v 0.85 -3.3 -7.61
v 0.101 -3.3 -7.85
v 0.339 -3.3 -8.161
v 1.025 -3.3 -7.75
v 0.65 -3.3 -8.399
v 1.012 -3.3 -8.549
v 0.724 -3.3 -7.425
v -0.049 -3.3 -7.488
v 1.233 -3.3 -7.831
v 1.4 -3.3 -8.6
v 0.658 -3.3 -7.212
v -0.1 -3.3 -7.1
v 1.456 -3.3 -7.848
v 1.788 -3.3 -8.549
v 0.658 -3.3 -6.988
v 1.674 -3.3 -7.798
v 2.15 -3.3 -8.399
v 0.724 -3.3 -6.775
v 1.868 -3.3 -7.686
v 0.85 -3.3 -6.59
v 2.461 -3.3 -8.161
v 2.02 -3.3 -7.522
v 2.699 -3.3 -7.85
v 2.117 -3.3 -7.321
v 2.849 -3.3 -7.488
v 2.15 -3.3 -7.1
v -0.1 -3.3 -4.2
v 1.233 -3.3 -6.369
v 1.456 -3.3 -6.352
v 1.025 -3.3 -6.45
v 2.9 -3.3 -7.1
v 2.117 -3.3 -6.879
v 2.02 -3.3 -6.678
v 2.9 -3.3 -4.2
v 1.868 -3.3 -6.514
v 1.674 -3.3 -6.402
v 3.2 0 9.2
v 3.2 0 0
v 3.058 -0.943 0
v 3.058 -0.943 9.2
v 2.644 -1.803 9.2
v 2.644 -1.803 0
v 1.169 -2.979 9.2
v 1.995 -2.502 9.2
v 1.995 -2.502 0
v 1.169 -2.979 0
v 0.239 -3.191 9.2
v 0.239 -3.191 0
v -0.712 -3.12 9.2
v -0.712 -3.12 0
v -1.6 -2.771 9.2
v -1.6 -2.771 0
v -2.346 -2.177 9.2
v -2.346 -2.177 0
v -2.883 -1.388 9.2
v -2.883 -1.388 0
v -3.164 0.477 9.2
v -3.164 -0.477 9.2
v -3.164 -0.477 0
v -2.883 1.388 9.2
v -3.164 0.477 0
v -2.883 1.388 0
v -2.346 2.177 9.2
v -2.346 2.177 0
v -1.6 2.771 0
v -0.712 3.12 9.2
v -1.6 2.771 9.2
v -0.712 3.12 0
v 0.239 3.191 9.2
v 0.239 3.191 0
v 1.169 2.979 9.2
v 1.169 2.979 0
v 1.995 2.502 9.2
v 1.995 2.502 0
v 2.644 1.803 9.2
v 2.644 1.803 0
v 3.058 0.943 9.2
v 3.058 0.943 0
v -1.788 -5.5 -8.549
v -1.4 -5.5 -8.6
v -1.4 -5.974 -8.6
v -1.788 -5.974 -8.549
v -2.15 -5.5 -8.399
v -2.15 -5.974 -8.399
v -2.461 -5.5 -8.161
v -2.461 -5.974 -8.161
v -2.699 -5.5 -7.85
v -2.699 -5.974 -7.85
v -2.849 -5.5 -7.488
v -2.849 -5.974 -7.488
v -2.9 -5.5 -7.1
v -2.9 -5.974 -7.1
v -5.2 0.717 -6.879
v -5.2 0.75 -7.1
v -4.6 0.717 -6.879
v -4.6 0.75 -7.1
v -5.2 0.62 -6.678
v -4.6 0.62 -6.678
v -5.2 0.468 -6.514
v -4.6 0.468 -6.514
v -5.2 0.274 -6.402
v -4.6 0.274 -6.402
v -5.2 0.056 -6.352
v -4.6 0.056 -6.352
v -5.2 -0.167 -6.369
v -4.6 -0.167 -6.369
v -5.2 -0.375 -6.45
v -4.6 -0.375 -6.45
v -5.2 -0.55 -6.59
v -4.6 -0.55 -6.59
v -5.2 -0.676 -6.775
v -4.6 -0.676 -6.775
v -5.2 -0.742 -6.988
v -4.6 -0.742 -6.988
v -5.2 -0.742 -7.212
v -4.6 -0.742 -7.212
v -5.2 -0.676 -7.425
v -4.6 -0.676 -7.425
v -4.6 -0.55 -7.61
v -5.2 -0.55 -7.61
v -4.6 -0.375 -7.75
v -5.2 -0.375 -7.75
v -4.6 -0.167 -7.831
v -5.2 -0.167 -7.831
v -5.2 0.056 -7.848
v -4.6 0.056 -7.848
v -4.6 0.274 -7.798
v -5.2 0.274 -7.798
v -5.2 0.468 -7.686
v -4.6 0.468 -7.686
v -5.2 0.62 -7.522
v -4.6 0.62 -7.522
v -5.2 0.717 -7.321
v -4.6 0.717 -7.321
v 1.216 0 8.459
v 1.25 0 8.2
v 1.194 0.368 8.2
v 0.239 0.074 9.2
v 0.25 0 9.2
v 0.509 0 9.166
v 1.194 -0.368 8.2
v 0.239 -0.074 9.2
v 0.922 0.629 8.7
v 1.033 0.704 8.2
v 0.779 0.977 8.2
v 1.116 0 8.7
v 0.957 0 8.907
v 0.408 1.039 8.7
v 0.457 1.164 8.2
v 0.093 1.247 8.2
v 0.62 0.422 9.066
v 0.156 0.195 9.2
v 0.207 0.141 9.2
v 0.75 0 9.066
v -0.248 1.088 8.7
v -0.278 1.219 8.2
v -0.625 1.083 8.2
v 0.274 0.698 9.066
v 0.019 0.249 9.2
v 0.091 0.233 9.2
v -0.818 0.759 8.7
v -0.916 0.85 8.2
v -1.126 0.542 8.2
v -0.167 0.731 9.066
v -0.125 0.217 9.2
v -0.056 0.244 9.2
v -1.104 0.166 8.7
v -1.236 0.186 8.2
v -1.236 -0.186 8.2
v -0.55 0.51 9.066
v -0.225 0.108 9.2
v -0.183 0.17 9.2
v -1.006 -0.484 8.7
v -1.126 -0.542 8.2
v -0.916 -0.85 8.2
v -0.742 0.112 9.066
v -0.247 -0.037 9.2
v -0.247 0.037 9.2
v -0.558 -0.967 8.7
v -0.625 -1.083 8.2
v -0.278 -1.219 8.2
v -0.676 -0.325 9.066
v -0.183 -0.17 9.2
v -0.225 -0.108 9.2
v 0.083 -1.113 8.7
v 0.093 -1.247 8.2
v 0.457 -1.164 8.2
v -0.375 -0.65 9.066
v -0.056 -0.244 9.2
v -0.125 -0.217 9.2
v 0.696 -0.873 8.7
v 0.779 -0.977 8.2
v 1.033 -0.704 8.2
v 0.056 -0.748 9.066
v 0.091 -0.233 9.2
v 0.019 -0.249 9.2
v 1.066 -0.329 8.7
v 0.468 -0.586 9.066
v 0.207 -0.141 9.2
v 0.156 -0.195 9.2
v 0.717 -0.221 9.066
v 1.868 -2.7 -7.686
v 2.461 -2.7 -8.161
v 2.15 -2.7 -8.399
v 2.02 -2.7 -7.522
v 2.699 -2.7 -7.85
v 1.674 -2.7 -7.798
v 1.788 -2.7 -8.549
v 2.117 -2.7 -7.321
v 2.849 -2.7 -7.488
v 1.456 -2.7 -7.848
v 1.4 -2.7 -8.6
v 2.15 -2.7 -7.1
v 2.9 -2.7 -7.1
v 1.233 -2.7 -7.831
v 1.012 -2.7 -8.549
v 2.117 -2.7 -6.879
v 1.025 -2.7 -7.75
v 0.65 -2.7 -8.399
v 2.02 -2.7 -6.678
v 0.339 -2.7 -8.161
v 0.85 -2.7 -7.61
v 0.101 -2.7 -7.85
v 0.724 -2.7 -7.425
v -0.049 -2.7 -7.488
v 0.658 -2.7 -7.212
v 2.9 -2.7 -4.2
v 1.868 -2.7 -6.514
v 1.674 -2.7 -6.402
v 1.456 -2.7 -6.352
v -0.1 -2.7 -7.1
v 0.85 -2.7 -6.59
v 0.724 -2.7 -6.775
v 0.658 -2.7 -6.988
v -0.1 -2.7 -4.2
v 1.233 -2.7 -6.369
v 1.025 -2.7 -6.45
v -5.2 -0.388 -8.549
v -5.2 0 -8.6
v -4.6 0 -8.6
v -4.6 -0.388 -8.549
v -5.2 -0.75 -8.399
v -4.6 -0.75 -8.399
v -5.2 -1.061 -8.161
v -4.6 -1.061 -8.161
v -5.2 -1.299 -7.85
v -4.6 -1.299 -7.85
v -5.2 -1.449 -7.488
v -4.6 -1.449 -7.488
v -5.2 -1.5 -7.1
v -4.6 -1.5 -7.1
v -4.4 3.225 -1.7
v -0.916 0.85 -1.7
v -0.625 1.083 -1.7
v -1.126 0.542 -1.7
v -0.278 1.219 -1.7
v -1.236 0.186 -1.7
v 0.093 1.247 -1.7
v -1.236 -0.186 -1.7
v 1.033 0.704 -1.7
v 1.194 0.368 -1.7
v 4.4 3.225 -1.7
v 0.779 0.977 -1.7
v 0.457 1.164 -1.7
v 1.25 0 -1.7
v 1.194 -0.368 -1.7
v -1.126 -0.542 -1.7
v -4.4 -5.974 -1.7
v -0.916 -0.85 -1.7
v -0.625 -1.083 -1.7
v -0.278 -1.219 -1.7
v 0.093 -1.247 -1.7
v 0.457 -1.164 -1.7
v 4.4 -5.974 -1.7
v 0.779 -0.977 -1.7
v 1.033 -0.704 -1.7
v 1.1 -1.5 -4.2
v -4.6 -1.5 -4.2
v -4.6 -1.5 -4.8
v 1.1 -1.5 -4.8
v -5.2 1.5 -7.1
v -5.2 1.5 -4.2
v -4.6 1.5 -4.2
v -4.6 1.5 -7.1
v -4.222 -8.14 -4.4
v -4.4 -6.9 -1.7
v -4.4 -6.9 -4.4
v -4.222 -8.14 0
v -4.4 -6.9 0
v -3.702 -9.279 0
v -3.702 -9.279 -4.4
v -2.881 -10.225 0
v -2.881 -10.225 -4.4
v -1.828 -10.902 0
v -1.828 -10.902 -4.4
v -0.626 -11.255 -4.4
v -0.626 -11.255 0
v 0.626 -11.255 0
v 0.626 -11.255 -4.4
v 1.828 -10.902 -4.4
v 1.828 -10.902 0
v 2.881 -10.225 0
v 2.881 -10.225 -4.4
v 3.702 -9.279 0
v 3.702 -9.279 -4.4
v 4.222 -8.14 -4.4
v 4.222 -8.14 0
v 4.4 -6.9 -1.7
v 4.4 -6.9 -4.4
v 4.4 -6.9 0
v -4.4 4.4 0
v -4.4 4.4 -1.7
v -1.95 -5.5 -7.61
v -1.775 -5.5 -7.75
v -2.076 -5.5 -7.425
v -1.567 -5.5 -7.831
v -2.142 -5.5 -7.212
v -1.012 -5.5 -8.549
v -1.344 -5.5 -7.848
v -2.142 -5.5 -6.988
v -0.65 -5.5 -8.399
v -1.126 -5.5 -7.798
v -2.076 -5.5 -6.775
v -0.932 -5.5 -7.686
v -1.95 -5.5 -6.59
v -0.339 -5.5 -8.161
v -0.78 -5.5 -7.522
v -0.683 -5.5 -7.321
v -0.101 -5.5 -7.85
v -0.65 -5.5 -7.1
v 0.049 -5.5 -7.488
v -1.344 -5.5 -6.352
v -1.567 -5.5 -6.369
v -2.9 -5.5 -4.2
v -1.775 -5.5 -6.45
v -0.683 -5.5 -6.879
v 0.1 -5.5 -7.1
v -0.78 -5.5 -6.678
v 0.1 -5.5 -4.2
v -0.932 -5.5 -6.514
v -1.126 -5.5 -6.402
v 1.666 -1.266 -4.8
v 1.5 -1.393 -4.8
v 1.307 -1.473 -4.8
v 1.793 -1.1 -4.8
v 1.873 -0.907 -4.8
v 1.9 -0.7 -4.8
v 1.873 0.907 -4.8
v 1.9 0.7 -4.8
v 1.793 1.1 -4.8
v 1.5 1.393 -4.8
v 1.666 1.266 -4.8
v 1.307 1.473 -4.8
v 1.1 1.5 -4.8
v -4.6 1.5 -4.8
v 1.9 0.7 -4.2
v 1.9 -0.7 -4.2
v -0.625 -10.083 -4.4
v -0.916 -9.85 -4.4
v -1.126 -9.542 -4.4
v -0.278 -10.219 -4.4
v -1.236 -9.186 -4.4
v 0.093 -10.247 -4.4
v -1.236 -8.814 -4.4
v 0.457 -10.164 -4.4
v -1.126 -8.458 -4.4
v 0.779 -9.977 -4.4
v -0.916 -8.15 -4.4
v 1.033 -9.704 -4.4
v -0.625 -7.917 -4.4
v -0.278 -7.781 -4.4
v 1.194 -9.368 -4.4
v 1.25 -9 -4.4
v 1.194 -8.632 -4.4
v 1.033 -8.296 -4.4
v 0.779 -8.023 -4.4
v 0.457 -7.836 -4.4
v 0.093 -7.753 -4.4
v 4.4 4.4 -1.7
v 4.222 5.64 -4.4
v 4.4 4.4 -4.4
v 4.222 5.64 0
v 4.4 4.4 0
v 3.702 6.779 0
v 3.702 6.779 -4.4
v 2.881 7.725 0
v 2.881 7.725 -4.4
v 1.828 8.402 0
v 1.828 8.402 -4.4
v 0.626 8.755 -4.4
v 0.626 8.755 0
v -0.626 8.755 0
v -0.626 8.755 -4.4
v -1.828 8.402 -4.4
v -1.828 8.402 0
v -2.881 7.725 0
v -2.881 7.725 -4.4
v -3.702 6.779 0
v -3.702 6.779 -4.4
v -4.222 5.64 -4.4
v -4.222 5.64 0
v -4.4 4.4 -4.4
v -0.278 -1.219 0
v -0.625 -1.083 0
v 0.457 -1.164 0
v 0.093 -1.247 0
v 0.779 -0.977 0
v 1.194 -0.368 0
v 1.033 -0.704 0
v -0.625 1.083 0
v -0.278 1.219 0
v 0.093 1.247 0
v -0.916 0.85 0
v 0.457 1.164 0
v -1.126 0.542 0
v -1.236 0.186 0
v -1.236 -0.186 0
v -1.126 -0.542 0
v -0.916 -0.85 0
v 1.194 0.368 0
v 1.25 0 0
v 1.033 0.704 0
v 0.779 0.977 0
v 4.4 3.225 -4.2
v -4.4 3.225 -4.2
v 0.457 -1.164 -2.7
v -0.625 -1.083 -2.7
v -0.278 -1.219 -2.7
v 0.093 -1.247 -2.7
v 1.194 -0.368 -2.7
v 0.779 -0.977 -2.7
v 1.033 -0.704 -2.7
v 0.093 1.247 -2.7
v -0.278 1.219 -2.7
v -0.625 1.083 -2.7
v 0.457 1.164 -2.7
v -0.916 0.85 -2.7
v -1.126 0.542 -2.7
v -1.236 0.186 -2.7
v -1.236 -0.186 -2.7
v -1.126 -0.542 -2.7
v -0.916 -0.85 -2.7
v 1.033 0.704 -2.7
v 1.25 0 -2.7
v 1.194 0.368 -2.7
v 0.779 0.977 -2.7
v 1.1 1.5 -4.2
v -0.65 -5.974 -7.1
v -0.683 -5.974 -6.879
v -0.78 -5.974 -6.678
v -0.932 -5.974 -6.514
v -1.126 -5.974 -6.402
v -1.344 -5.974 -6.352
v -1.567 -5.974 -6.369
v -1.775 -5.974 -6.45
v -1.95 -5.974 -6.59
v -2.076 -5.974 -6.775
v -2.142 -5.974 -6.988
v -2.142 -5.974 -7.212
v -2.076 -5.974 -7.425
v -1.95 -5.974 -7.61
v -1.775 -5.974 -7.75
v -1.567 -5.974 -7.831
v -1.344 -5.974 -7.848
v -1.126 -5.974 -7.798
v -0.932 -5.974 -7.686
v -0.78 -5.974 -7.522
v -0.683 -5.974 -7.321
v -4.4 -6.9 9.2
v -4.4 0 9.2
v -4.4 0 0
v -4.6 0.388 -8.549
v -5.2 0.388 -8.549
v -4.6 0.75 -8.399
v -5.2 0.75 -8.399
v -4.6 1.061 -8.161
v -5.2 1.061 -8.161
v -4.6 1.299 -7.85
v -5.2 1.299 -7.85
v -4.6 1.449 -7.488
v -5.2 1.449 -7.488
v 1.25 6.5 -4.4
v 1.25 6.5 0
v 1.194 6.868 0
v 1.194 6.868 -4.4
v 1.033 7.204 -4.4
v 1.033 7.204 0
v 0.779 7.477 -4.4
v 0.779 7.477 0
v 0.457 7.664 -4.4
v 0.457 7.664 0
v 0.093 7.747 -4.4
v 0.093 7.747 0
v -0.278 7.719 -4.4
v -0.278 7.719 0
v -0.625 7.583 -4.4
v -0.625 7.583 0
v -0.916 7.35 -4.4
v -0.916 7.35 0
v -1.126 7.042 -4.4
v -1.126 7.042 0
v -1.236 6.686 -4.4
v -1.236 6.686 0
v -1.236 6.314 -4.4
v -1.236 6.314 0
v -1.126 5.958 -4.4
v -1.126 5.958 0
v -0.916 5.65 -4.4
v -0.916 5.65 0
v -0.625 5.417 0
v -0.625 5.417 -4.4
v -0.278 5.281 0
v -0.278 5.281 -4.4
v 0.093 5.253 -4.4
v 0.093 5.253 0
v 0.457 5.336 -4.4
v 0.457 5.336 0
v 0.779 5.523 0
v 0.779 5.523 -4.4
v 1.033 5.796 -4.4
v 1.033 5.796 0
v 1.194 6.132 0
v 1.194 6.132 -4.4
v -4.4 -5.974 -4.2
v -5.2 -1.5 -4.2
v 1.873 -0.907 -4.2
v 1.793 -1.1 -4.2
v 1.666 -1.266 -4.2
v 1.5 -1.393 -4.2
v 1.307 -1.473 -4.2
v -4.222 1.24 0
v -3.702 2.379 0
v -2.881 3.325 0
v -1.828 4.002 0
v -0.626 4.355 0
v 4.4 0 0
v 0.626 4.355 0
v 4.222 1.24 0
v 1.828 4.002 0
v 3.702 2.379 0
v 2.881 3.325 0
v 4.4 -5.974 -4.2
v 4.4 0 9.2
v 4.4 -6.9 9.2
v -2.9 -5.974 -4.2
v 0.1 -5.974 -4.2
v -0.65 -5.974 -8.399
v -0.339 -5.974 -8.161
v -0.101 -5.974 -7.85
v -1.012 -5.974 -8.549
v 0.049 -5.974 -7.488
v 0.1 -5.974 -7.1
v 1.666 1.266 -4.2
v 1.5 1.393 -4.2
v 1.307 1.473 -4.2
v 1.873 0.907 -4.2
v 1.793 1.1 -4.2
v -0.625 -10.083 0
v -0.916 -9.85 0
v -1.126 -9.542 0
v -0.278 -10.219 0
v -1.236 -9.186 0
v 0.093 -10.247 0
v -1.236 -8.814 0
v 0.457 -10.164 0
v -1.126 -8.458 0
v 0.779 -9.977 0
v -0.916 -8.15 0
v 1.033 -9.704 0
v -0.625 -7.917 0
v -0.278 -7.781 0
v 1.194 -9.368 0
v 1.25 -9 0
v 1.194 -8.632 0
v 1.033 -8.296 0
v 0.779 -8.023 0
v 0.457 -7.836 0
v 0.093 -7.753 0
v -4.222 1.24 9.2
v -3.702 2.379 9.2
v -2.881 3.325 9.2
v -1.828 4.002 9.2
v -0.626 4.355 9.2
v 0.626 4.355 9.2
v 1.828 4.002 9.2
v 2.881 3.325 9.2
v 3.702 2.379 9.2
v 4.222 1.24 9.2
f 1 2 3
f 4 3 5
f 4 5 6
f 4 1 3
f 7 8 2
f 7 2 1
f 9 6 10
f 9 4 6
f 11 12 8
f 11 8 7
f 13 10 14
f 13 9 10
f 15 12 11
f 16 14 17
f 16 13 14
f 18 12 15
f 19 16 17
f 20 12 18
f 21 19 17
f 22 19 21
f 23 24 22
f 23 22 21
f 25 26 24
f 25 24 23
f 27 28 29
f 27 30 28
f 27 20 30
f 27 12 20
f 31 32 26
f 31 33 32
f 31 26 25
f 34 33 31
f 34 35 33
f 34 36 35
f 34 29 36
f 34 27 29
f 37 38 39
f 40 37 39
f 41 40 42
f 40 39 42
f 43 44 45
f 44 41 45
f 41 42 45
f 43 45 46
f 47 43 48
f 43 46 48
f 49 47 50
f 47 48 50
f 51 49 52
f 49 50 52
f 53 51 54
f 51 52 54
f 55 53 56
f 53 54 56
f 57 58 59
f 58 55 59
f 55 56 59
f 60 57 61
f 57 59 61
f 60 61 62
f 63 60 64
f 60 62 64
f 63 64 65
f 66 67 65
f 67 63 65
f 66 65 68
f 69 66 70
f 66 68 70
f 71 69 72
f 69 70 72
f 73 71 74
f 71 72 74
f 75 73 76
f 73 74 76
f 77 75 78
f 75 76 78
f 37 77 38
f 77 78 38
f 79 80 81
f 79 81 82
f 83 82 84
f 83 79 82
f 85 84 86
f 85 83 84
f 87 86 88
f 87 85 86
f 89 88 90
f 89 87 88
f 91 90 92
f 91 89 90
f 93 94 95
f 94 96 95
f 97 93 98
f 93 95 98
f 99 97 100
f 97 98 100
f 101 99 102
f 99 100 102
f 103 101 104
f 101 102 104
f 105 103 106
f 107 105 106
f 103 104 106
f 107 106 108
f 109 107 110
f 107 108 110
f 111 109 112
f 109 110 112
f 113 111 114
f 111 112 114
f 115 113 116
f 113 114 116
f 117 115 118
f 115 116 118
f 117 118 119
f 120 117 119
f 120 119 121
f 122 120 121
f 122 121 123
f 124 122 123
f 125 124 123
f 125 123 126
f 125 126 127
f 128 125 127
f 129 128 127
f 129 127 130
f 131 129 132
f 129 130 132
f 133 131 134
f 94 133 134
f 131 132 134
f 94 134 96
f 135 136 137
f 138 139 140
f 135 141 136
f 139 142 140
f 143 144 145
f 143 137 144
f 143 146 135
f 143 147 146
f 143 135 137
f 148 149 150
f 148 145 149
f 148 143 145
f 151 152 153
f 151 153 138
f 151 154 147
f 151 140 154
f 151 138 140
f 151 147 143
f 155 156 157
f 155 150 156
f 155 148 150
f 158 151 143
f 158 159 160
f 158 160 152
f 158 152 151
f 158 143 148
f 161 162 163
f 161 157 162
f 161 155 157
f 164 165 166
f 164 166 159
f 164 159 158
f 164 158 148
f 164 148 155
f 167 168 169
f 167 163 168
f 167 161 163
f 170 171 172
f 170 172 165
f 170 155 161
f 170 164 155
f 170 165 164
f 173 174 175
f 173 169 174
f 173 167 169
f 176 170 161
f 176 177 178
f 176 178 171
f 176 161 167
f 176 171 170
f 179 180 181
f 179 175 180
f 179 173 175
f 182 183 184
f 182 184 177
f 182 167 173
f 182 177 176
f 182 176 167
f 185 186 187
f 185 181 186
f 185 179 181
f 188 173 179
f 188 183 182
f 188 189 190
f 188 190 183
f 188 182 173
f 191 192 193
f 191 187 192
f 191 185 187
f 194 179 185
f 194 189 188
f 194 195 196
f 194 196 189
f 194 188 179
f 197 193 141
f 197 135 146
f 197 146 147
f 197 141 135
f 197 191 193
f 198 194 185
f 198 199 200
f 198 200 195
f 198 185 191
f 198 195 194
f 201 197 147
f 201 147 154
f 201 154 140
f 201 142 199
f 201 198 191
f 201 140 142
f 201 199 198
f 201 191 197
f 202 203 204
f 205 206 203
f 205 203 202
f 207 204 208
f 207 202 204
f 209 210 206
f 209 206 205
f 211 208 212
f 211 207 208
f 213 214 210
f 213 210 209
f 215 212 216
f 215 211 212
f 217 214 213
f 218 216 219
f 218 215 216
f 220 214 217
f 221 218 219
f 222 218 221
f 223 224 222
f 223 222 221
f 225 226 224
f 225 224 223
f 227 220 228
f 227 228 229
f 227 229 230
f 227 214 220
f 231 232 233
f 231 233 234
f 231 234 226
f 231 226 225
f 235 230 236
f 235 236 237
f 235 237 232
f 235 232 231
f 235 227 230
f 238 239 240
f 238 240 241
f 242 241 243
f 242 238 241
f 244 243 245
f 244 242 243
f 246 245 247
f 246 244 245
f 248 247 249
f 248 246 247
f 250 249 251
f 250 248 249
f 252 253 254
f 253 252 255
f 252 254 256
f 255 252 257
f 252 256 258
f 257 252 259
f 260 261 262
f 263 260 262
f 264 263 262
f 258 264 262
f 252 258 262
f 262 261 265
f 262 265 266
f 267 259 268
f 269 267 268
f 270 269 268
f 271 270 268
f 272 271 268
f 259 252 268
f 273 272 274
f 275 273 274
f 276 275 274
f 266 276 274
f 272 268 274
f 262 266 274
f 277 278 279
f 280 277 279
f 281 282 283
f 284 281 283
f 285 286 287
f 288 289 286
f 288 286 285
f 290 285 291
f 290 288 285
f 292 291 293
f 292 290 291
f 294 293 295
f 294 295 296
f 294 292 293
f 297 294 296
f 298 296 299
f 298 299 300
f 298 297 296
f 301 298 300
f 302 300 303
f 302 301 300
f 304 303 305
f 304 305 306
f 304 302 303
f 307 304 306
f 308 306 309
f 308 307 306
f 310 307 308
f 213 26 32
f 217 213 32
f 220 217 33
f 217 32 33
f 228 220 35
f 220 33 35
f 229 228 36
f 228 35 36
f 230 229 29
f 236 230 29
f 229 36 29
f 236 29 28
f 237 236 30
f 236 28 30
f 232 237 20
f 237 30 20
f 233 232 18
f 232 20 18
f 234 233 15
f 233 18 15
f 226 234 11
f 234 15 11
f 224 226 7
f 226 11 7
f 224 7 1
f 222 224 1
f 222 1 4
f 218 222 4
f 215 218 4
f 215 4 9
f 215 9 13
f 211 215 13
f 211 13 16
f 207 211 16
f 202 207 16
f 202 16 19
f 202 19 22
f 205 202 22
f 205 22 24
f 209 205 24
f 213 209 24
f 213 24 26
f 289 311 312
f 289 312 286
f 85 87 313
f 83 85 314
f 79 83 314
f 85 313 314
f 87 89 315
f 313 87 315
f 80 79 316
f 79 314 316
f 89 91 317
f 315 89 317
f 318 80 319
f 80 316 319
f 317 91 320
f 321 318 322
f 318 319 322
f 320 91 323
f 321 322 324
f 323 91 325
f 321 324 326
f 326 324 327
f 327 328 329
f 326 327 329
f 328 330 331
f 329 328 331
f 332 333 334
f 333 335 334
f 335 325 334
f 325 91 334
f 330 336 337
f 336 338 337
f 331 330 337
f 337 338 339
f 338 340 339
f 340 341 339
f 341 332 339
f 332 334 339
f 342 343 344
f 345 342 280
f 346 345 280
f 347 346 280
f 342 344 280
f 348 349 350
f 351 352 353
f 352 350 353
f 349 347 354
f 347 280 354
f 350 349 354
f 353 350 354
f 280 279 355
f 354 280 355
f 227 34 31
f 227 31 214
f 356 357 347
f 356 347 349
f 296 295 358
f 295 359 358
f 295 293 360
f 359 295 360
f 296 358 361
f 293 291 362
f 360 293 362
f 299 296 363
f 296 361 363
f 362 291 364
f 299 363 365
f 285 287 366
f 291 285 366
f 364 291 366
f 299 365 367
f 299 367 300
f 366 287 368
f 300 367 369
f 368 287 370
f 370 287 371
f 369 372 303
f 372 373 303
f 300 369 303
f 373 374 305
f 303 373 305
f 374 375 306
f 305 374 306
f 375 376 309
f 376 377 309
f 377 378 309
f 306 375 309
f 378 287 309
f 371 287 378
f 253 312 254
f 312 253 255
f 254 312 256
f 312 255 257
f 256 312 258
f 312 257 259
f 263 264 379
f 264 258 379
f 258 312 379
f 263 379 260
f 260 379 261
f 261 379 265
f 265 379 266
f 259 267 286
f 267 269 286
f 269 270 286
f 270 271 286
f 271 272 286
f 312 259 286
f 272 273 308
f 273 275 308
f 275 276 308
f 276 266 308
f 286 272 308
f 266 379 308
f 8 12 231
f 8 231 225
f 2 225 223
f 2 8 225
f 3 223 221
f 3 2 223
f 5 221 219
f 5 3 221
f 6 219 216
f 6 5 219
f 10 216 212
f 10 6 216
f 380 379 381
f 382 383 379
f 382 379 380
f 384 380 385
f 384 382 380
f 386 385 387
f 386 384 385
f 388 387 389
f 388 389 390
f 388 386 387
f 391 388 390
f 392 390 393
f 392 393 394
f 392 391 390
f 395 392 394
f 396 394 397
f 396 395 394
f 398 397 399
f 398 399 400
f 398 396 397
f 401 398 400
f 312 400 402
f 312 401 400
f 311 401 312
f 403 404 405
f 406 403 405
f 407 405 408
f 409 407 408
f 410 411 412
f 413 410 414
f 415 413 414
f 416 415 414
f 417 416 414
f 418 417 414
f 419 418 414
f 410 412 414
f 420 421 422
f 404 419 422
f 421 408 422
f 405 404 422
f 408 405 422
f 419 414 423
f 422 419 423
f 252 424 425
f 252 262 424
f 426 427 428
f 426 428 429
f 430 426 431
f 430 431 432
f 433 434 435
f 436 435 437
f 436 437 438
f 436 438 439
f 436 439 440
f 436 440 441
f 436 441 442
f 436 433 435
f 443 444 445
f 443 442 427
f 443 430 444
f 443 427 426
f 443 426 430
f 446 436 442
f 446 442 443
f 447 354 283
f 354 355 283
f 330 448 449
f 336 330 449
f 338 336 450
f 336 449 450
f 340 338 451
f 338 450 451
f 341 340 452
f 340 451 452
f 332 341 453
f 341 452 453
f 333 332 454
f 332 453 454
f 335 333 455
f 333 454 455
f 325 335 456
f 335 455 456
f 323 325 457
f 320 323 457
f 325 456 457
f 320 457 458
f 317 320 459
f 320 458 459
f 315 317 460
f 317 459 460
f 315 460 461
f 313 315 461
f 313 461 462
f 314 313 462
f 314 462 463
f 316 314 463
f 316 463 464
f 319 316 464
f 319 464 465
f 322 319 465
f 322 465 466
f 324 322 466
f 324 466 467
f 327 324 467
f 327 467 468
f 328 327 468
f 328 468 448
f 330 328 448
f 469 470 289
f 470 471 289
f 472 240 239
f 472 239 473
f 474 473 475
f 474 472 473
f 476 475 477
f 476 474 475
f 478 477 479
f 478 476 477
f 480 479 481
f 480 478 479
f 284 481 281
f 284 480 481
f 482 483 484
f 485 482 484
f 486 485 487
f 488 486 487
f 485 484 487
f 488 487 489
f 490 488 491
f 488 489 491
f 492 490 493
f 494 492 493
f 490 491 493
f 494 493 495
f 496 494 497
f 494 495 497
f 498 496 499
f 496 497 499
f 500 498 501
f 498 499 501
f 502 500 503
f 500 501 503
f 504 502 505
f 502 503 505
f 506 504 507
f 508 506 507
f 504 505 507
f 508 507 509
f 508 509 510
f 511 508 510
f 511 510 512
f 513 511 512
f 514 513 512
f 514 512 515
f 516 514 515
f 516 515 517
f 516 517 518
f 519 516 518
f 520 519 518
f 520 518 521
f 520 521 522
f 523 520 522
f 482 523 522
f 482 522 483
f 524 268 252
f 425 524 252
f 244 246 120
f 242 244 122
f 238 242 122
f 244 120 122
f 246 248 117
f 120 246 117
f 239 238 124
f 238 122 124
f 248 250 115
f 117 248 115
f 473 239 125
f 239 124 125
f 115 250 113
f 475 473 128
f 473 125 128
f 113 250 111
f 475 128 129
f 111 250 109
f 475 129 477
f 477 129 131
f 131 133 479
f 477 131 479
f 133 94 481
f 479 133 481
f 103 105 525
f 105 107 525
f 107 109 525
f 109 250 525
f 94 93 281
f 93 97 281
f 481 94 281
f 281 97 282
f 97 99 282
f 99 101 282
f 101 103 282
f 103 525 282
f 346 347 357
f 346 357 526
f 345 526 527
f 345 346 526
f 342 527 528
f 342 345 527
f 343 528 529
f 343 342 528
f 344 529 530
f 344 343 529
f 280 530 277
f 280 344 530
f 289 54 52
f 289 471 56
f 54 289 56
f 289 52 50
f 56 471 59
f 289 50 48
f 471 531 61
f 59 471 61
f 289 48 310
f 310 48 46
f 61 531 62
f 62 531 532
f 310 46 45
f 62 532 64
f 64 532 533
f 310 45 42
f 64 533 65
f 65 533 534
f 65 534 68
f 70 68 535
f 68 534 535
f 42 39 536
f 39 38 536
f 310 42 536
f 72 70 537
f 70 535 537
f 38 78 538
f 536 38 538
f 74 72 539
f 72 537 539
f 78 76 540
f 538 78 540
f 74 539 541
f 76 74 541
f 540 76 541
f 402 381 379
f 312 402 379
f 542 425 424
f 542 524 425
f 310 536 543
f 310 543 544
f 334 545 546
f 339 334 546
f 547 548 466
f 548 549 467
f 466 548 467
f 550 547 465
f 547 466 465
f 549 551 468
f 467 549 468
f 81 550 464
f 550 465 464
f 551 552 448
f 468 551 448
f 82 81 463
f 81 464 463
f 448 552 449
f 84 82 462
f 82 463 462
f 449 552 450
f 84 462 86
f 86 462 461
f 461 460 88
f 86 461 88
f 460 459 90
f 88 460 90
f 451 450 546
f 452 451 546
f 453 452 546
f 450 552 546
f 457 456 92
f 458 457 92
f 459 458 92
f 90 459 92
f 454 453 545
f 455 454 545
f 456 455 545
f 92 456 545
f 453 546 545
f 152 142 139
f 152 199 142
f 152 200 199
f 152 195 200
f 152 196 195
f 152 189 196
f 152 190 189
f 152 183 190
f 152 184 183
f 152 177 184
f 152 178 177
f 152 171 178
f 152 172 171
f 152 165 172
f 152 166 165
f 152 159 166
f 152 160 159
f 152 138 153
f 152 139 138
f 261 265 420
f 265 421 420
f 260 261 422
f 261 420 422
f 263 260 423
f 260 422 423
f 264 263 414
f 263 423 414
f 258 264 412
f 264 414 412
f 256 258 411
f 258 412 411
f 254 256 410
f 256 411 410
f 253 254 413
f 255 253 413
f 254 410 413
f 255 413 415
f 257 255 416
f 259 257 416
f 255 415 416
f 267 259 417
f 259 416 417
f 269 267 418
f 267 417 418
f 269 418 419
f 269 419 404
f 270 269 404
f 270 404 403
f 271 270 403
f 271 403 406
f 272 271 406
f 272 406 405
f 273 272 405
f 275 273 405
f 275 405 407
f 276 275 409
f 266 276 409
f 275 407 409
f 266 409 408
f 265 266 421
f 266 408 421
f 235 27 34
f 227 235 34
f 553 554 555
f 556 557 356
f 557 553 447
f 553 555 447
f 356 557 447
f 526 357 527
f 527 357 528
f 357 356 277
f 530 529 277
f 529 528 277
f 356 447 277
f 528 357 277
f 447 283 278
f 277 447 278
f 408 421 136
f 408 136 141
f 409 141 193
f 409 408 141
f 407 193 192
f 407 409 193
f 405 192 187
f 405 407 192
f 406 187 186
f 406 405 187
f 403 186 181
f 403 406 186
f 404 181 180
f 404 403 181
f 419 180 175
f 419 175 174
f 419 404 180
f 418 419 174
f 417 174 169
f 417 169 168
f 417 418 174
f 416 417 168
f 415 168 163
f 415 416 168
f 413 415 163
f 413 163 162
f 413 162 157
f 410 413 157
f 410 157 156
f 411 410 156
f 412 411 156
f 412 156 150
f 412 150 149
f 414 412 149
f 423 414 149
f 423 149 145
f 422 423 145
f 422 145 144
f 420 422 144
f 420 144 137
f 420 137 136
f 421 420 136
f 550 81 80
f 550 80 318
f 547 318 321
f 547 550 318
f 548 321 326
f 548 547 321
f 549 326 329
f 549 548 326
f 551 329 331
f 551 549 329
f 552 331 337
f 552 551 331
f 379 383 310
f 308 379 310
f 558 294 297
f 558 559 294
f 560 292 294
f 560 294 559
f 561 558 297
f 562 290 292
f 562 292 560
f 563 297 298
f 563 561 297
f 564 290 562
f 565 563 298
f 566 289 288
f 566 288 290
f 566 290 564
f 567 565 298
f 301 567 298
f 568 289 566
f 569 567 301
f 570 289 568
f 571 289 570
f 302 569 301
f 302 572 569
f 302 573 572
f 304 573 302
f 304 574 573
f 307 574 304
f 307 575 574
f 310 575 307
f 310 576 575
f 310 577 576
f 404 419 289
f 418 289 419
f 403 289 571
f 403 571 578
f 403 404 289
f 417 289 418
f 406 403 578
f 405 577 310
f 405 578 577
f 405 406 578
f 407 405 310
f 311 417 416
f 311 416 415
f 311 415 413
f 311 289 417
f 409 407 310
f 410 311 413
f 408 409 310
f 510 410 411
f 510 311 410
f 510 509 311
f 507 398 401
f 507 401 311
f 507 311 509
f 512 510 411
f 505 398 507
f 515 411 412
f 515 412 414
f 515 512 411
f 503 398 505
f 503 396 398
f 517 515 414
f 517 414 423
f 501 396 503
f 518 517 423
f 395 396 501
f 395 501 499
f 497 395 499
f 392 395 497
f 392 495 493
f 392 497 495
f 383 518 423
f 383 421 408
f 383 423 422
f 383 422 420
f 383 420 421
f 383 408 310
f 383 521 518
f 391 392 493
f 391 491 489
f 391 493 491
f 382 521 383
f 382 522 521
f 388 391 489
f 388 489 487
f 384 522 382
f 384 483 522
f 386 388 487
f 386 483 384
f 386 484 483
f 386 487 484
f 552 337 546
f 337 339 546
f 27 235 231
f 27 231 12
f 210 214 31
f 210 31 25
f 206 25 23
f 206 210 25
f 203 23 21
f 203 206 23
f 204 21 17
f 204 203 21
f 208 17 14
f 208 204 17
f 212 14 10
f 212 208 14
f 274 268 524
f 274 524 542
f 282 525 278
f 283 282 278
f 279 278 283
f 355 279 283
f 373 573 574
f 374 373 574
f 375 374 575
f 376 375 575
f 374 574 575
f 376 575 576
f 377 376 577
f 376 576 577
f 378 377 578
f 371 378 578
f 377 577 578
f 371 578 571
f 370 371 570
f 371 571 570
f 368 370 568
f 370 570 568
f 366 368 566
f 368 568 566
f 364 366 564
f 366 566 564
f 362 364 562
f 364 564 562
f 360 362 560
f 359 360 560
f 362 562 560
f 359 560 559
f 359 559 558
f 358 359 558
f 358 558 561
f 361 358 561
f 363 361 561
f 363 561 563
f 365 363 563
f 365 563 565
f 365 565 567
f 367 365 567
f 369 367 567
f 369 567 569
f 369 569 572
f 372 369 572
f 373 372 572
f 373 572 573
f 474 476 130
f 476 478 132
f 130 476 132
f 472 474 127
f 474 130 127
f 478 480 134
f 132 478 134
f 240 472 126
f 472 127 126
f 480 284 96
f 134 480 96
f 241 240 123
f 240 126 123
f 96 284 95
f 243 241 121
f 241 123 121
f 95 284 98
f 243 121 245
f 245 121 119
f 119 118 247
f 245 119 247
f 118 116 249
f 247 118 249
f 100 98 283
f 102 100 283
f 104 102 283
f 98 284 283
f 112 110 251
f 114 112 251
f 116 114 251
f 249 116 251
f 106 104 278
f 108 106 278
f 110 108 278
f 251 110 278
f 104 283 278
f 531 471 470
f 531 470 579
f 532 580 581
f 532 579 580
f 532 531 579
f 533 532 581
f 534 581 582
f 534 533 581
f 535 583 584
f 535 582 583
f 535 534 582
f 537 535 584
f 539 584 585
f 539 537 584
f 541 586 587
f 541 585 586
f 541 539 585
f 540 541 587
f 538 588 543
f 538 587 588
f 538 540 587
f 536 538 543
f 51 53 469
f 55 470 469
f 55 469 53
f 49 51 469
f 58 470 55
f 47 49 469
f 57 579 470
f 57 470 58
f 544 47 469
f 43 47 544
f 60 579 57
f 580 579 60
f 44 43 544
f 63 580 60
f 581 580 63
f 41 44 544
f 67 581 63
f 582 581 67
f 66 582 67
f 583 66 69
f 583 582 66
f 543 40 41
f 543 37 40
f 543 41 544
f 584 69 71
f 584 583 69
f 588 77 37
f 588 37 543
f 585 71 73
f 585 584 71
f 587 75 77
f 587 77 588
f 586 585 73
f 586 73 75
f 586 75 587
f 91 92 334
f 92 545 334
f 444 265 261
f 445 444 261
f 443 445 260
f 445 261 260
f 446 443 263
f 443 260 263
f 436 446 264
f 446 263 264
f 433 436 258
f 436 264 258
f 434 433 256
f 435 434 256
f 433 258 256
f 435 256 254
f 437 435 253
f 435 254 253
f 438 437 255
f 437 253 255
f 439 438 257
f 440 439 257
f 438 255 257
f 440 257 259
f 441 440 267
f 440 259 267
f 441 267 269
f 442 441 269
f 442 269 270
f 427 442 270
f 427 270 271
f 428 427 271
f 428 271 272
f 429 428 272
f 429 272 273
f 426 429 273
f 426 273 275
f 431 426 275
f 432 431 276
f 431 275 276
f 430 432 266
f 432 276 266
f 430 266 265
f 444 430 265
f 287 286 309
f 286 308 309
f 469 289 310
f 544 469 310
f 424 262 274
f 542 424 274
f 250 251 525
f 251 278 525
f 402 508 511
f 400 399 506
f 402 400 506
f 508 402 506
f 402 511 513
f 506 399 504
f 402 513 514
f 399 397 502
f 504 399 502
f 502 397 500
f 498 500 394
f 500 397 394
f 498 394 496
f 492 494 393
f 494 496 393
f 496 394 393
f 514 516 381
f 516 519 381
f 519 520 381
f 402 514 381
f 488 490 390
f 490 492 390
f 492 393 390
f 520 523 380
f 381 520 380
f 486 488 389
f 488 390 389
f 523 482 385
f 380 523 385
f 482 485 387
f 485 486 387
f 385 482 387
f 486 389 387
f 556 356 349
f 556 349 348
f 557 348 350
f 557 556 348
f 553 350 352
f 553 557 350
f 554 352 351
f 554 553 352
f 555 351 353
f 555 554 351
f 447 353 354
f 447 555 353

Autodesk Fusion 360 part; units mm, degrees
sketch "Sketch11" plane through (0, 0, 0) normal (0, 0, 1) x (1, 0, 0)
  circle A0 centre (0, 0) radius 1.25
  circle A1 centre (0, 0) radius 3.2
  line L0 (-10, 0) -> (10, 0) construction
  line L1 (0, 12) -> (0, -25) construction
  line L2 (0, 0) -> (0, -9) construction
  circle A2 centre (0, -9) radius 1.25
  line L3 (0, 0) -> (0, 6.5) construction
  circle A3 centre (0, 6.5) radius 1.25
  line L4 (0, 6.5) -> (0, 9) construction
  line L5 (0, -9) -> (0, -11.5) construction
  line L6 (-4.4, 4.4) -> (-4.4, -6.9)
  line L7 (4.4, 4.4) -> (4.4, -6.9)
  line L8 (-4.4, 9) -> (4.4, 9) construction
  line L9 (-4.4, -11.5) -> (4.4, -11.5) construction
  line L10 (-8, 0) -> (-8, -6.9) construction
  line L11 (-4.4, -6.9) -> (4.4, -6.9)
  arc A4 (-4.4, -6.9) -> (4.4, -6.9) centre (0, -6.9) ccw
  line L12 (0, 6.5) -> (0, 4.4) construction
  line L13 (-4.4, 4.4) -> (4.4, 4.4) construction
  arc A5 (4.4, 4.4) -> (-4.4, 4.4) centre (0, 4.4) ccw
  arc A6 (-1.2373, 0.1776) -> (1.2373, 0.1776) centre (0, 4.4) ccw
  arc A7 (4.4, 0) -> (-4.4, 0) centre (0, 0) ccw
  dimension "d103" = 2.5
  dimension "d104" = 6.4
  dimension "d105" = 9
  dimension "d106" = 2.5
  dimension "d107" = 6.5
  dimension "d108" = 2.5
  dimension "d112" = 2.5
  dimension "d113" = 2.5
  dimension "d114" = 20.5
  dimension "d115" = 4.4
  dimension "d117" = 6.9
  dimension "d118" = 2.1
  dimension "d119" = 2.1
extrude "Extrude16" add sketch "Sketch11" along normal blind 9.2 contours L6 L7 L11 A7 makes body 1
extrude "Extrude17" add sketch "Sketch11" against normal blind 4.4 separate body contours A0 A6 | A0 A6 | A1 | L6 L7 A5 A7 | L6 L7 L11 A7 | L11 A4 makes body 2
extrude "Extrude18" add sketch "Sketch11" along normal blind 9.2 separate body contours A0 A6 | A0 A6 makes body 3
fillet "Fillet17" radius 1 1 edges at (-1.1654, -0.452, 9.2) on bodies 3
sketch "Sketch12" plane through (4.4, 0, 0) normal (1, 0, 0) x (0, 1, 0)
  line L0 (4.4, 0) -> (-6.9, 0)
  line L1 (-6.9, 0) -> (-6.9, -4.4)
  line L2 (-6.9, -4.4) -> (4.4, -4.4)
  line L3 (4.4, -4.4) -> (4.4, 0)
  line L4 (-6.9, -4.4) -> (4.4, -4.4) construction
  line L5 (4.4, -4.4) -> (4.4, -1.7) construction
  line L6 (4.4, -1.7) -> (-6.9, -1.7)
  line L7 (-6.9, -1.7) -> (-6.9, -4.4) construction
  dimension "d128" = 2.7
extrude "Extrude19" cut sketch "Sketch12" against normal blind 8.8 contours L1 L2 L3 L6 bodies 2
sketch "Sketch13" plane through (0, 0, -1.7) normal (0, 0, -1) x (1, 0, 0)
  line L0 (4.4, -4.4) -> (4.4, 6.9)
  line L1 (4.4, 6.9) -> (-4.4, 6.9)
  line L2 (-4.4, 6.9) -> (-4.4, -4.4)
  line L3 (-4.4, -4.4) -> (4.4, -4.4)
  line L4 (4.4, -3.225) -> (-4.4, -3.225)
  line L5 (-4.4, -3.225) -> (-4.4, 5.9743)
  line L6 (-4.4, 5.9743) -> (4.4, 5.9743)
  line L7 (4.4, 5.9743) -> (4.4, -3.225)
extrude "Extrude20" add sketch "Sketch13" along normal blind 2.5 separate body contours L0 L2 L4 L5 L6 L7 makes body 4
sketch "Sketch14" plane through (0, 0, -4.2) normal (0, 0, -1) x (1, 0, 0)
  line L0 (4.4, 5.9743) -> (-4.4, 5.9743)
  line L1 (-4.4, 5.9743) -> (-4.4, -3.225)
  line L2 (-4.4, -3.225) -> (4.4, -3.225)
  line L3 (4.4, -3.225) -> (4.4, 5.9743)
  line L4 (0, -5) -> (0, 12) construction
  line L5 (8, 0) -> (-9, 0) construction
  line L6 (-1.4, -4.5489) -> (-1.4, 6) construction
  line L7 (7.8832, 3) -> (-7, 3) construction
  line L8 (8, 5.8) -> (-11, 5.8) construction
  line L9 (-4.9, -5) -> (-4.9, 8) construction
  line L10 (-5.2, -1.5) -> (-4.6, -1.5)
  line L11 (-4.6, -1.5) -> (-4.6, 1.5)
  line L12 (-4.6, 1.5) -> (-5.2, 1.5)
  line L13 (-5.2, 1.5) -> (-5.2, -1.5)
  line L14 (-5.2, -1.5) -> (-4.6, 1.5) construction
  line L15 (-4.6, -1.5) -> (-5.2, 1.5) construction
  line L16 (1.4, -4.5489) -> (1.4, 6) construction
  line L17 (2.9, 2.7) -> (-0.1, 2.7)
  line L18 (-0.1, 2.7) -> (-0.1, 3.3)
  line L19 (-0.1, 3.3) -> (2.9, 3.3)
  line L20 (2.9, 3.3) -> (2.9, 2.7)
  line L21 (-2.9, 5.5) -> (0.1, 5.5)
  line L22 (0.1, 5.5) -> (0.1, 6.1)
  line L23 (0.1, 6.1) -> (-2.9, 6.1)
  line L24 (-2.9, 6.1) -> (-2.9, 5.5)
  line L25 (-2.9, 5.5) -> (0.1, 6.1) construction
  line L26 (0.1, 5.5) -> (-2.9, 6.1) construction
  point P0 (-4.9, 0)
  point P1 (-1.4, 5.8)
  dimension "d136" = 1.4
  dimension "d137" = 3
  dimension "d141" = 5.8
  dimension "d166" = 0.6
  dimension "d167" = 3
  dimension "d177" = 2.8
  dimension "d178" = 3
  dimension "d179" = 0.6
  dimension "d180" = 3
  dimension "d181" = 0.6
extrude "Extrude21" add sketch "Sketch14" along normal blind 4.4 separate body contours L0 L21 L22 L24 | L10 L11 L12 L13 | L17 L18 L19 L20 makes body 5 at (-1.9, -5.5, -5.6667) makes body 6 at (-5.2, -0.5, -5.6667) makes body 7 at (1.9, -2.7, -5.6667)
fillet "Fillet18" radius 1.5 6 edges at (-2.9, -5.7371, -8.6) (0.1, -5.7371, -8.6) (-4.9, -1.5, -8.6) (-4.9, 1.5, -8.6) (-0.1, -3, -8.6) (2.9, -3, -8.6) on bodies 5 6 7
sketch "Sketch19" plane through (-4.6, 0, 0) normal (1, 0, 0) x (0, 1, 0)
  arc A0 (-1.5, -7.1) -> (1.5, -7.1) centre (0, -7.1) ccw
  line L0 (1.5, -7.1) -> (1.5, -4.2)
  line L1 (1.5, -4.2) -> (-1.5, -4.2)
  line L2 (-1.5, -4.2) -> (-1.5, -7.1)
  circle A1 centre (0, -7.1) radius 0.75
  dimension "d168" = 1.5
extrude "Extrude23" cut sketch "Sketch19" against normal blind 0.6 contours A1 bodies 6
sketch "Sketch21" plane through (0, -3.3, 0) normal (0, -1, 0) x (1, 0, 0)
  arc A0 (-0.1, -7.1) -> (2.9, -7.1) centre (1.4, -7.1) ccw
  line L0 (2.9, -7.1) -> (2.9, -4.2)
  line L1 (2.9, -4.2) -> (-0.1, -4.2)
  line L2 (-0.1, -4.2) -> (-0.1, -7.1)
  circle A1 centre (1.4, -7.1) radius 0.75
  dimension "d182" = 1.5
extrude "Extrude29" cut sketch "Sketch21" against normal blind 0.6 contours A1 bodies 7
sketch "Sketch22" plane through (0, -5.9743, 0) normal (0, -1, 0) x (1, 0, 0)
  arc A0 (-2.9, -7.1) -> (0.1, -7.1) centre (-1.4, -7.1) ccw
  line L0 (0.1, -7.1) -> (0.1, -4.2)
  line L1 (0.1, -4.2) -> (-2.9, -4.2)
  line L2 (-2.9, -4.2) -> (-2.9, -7.1)
  circle A1 centre (-1.4, -7.1) radius 0.75
  dimension "d185" = 1.5
extrude "Extrude30" cut sketch "Sketch22" against normal blind 0.6 contours A1 bodies 5
sketch "Sketch20" plane through (-4.6, 0, 0) normal (1, 0, 0) x (0, 1, 0)
  arc A0 (-1.5, -7.1) -> (1.5, -7.1) centre (0, -7.1) ccw
  line L0 (1.5, -7.1) -> (1.5, -4.2)
  line L1 (1.5, -4.2) -> (-1.5, -4.2)
  line L2 (-1.5, -4.2) -> (-1.5, -7.1)
  line L3 (1.5, -4.2) -> (-1.5, -4.2)
  line L4 (-1.5, -4.2) -> (-1.5, -4.8)
  line L5 (-1.5, -4.8) -> (1.5, -4.8)
  line L6 (1.5, -4.8) -> (1.5, -4.2)
  circle A1 centre (0, -7.1) radius 0.75
  dimension "d171" = 3
  dimension "d172" = 0.6
extrude "Extrude28" add sketch "Sketch20" along normal blind 6.5 separate body contours L0 L1 L2 L3 L4 L5 L6 makes body 8
extrude "Extrude26" cut sketch "Sketch11" against normal blind 2.7 contours A0 A6 | A0 A6 bodies 2 4
fillet "Fillet20" radius 0.8 2 edges at (1.9, -1.5, -4.5) (1.9, 1.5, -4.5) on bodies 8
